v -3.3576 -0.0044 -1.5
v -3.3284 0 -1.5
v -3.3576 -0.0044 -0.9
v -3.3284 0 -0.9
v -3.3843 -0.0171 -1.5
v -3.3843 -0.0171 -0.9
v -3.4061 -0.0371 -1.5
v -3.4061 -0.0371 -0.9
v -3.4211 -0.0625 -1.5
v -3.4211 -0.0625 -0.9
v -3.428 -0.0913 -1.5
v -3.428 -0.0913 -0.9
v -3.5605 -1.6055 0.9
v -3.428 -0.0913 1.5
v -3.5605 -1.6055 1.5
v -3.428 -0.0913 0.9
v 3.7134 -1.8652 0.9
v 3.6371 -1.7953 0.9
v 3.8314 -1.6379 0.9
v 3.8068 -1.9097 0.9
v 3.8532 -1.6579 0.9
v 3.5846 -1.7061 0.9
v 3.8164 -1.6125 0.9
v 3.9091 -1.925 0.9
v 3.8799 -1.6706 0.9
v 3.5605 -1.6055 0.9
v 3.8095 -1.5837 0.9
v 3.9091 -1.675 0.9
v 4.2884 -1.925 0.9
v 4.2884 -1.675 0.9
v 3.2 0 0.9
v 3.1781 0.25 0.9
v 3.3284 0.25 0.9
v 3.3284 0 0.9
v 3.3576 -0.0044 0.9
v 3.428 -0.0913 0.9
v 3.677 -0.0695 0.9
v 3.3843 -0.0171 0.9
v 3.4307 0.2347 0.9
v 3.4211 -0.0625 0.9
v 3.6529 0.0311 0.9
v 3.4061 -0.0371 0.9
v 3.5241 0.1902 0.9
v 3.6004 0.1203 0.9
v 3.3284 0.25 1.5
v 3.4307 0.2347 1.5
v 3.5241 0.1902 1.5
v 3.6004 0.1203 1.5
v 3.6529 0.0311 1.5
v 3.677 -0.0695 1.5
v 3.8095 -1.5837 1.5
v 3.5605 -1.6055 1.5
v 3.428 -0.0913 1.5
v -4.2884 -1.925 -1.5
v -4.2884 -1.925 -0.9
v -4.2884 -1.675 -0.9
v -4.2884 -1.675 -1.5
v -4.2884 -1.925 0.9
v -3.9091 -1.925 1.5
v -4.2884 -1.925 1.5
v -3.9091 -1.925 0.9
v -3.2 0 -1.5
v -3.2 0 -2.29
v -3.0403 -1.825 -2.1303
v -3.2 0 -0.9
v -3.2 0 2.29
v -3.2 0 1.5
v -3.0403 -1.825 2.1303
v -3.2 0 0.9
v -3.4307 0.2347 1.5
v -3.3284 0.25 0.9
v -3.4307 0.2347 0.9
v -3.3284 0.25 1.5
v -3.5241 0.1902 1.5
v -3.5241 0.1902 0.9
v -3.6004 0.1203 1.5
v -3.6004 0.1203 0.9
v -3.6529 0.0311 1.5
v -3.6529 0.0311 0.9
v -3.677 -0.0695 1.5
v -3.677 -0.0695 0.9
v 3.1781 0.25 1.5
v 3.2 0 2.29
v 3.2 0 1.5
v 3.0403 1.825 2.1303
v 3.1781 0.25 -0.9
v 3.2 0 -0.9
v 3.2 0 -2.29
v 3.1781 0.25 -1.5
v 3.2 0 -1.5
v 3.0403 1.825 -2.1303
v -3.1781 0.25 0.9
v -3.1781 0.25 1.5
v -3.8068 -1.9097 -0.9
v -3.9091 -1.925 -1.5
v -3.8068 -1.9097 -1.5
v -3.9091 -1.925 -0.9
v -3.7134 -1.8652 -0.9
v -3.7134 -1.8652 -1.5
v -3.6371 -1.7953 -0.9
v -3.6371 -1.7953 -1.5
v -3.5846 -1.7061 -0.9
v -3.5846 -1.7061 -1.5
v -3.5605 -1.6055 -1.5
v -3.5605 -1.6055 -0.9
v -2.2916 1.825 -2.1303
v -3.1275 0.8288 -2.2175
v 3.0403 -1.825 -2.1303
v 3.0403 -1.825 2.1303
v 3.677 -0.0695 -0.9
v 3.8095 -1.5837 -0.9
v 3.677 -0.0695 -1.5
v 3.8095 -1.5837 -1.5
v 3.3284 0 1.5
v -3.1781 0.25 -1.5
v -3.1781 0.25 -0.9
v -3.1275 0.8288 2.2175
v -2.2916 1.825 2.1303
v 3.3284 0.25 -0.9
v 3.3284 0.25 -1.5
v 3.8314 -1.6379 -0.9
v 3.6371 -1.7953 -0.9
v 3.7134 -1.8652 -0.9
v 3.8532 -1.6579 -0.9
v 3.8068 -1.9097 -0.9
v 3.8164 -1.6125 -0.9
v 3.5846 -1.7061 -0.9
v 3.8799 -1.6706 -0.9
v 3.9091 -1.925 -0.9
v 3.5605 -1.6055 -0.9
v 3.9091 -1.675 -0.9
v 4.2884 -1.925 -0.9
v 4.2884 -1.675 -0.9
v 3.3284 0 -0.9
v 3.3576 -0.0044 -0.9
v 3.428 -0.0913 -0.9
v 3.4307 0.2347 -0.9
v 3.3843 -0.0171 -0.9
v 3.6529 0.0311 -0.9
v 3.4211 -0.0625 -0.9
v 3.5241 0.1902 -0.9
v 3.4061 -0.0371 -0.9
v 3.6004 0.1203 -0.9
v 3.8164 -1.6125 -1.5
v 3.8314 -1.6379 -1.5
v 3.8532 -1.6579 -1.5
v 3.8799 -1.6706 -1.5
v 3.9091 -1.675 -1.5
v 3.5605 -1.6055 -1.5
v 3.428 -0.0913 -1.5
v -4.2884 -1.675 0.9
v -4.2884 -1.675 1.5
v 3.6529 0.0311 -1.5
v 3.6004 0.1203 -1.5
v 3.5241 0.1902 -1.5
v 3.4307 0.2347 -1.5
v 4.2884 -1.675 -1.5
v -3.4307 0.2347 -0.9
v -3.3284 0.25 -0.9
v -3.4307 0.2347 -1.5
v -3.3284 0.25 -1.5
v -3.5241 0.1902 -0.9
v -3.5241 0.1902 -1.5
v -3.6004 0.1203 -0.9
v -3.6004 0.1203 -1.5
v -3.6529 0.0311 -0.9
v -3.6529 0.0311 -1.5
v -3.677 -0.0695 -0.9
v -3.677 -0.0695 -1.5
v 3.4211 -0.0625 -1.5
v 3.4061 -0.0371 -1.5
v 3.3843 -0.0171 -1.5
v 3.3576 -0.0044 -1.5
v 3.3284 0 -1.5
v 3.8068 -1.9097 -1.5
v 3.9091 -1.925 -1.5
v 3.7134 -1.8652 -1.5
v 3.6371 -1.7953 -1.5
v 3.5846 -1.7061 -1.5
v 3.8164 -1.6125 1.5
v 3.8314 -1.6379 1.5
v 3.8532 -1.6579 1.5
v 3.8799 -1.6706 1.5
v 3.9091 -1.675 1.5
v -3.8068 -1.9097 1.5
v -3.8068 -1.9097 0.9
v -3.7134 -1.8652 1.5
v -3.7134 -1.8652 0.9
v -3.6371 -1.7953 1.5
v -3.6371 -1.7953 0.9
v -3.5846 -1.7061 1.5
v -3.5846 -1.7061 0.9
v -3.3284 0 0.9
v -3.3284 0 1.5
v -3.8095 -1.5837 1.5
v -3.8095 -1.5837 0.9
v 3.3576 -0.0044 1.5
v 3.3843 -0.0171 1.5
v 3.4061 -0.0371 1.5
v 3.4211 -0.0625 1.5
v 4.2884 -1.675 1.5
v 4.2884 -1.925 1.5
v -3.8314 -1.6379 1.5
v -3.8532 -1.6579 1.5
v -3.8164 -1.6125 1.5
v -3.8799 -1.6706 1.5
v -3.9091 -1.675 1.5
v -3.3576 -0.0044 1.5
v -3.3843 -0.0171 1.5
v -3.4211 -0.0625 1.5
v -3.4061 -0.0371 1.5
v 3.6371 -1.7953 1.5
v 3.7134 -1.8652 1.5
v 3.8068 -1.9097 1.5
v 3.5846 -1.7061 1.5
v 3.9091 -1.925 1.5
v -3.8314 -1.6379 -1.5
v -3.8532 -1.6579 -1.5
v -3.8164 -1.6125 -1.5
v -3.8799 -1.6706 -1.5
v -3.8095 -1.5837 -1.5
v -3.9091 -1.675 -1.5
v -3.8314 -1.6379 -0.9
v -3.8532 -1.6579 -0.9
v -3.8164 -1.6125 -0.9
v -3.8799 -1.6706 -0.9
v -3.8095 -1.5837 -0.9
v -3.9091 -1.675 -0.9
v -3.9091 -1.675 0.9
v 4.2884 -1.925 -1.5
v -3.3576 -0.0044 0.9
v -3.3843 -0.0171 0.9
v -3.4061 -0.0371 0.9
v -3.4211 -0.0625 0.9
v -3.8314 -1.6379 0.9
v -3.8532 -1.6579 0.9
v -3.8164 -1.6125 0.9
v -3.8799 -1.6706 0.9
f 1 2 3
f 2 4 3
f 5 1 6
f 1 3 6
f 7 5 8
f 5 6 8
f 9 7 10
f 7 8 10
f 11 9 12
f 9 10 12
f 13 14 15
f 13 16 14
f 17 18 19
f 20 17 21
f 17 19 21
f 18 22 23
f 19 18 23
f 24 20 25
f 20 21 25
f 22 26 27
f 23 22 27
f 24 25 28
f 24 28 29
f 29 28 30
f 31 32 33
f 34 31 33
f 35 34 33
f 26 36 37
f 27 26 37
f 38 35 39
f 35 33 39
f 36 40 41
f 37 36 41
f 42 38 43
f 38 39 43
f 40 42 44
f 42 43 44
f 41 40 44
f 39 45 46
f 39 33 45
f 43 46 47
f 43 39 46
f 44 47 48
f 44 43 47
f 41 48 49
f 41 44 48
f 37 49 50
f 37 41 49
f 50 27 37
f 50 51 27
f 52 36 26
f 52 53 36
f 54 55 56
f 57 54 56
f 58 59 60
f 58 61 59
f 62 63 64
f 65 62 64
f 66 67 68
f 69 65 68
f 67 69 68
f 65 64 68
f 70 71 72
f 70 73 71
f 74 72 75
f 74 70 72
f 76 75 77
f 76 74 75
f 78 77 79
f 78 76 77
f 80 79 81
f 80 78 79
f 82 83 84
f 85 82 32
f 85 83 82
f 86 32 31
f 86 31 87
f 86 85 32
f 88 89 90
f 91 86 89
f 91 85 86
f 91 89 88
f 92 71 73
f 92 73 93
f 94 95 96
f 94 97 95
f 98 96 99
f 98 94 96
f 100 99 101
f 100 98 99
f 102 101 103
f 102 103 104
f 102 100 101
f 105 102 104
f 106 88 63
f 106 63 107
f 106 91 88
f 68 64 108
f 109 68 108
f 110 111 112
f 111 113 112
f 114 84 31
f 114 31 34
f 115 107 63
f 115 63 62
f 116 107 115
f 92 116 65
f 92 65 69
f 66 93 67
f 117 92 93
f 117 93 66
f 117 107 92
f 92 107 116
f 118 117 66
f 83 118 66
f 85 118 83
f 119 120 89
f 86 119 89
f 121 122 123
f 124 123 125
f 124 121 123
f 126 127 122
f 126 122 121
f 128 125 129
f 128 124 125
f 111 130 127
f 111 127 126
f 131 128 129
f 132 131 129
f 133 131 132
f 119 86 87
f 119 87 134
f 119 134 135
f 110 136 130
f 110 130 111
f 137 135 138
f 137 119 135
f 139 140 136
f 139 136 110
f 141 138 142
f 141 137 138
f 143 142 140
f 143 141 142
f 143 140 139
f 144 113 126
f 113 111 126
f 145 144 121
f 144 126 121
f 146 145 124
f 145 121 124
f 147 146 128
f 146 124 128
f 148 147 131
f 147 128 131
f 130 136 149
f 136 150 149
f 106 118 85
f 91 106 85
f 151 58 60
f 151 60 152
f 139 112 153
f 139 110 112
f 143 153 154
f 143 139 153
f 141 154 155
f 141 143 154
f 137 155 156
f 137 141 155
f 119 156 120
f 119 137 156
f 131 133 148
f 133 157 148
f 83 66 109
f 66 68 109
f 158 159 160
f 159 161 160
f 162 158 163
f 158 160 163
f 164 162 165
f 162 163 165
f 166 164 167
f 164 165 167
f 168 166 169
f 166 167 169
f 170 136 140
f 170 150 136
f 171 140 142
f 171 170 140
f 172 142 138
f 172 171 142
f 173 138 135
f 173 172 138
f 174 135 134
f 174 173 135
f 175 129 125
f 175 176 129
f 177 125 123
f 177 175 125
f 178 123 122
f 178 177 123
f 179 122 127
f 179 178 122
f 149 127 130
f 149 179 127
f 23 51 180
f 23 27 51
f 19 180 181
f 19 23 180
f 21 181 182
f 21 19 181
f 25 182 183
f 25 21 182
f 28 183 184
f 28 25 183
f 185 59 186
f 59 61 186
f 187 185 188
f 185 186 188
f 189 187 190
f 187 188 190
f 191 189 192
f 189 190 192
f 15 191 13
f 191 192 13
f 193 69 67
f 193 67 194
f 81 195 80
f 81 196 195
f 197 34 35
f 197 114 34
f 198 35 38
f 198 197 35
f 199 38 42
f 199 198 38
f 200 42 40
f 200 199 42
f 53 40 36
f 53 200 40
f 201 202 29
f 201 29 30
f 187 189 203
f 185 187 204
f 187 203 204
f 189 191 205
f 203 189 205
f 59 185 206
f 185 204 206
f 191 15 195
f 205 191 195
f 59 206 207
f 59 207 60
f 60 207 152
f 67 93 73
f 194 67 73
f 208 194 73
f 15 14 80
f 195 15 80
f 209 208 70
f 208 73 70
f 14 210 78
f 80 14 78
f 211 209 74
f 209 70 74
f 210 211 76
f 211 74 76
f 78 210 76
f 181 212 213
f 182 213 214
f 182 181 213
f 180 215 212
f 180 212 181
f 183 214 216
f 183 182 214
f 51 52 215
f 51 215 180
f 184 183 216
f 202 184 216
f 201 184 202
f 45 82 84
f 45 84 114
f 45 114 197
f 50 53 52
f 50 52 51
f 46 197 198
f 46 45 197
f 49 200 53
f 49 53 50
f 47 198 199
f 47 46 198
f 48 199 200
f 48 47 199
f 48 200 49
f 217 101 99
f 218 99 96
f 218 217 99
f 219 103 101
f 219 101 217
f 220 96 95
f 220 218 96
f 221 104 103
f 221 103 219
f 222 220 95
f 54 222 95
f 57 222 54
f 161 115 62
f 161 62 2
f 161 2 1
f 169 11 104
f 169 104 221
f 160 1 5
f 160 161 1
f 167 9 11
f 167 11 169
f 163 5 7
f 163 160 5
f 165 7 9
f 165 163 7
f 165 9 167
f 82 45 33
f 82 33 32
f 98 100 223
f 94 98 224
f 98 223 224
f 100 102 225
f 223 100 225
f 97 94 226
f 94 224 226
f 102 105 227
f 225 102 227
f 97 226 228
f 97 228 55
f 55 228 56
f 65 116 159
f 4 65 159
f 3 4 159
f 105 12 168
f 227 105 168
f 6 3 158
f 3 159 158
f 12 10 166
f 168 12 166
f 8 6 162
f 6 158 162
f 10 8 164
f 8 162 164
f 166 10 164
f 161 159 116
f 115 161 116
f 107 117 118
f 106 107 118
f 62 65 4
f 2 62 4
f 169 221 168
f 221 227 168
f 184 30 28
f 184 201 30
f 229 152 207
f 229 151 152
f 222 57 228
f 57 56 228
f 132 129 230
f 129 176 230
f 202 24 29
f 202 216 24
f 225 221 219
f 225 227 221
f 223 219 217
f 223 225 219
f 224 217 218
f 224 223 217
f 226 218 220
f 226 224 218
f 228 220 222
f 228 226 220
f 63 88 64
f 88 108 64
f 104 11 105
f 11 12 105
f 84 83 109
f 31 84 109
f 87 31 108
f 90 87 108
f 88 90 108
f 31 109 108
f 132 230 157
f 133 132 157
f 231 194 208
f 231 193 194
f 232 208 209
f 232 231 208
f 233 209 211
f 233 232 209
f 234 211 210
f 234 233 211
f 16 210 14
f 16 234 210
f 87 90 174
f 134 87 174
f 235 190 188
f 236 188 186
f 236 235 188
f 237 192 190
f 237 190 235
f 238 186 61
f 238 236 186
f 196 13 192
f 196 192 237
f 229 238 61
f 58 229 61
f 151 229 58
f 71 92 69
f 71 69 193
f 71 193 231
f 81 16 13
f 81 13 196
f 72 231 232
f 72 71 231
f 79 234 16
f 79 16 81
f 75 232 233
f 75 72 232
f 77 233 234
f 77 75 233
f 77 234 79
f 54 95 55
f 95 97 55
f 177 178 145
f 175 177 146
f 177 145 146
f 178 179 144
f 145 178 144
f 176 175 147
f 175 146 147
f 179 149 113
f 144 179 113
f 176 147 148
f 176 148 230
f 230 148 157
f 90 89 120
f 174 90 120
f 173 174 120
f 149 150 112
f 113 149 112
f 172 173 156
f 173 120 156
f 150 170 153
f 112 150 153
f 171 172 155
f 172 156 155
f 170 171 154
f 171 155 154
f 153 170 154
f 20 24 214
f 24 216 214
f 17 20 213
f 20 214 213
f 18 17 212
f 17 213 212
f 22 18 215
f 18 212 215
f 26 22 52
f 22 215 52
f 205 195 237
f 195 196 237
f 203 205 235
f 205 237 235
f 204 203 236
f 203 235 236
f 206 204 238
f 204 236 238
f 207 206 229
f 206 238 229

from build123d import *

# Parameters (mm, degrees)
SKETCH1_W                = 6.4
SKETCH1_H                = 4.58
EXTRUDE1_DEPTH           = 1.825
EXTRUDE1_TAPER           = 5
EXTRUDE1_OTHER_WAY_DEPTH = 1.825
EXTRUDE1_OTHER_WAY_TAPER = 5
CHAMFER1_SIZE            = 1
CHAMFER1_SIZE_2          = 0.748750861
EXTRUDE2_START           = 1.2
EXTRUDE2_DEPTH           = 0.3
FILLET1_R                = 0.1
FILLET2_R                = 0.35


with BuildPart() as part:
    # Sketch1 → Extrude1 (new body)
    with BuildSketch(Plane(origin=(0, 0, 0), x_dir=(1, 0, 0), z_dir=(0, 1, 0))):
        Rectangle(SKETCH1_W, SKETCH1_H)
    extrude(amount=EXTRUDE1_DEPTH, taper=EXTRUDE1_TAPER)

    # Sketch1 → Extrude1 other way (add)
    with BuildSketch(Plane(origin=(0, 0, 0), x_dir=(1, 0, 0), z_dir=(0, 1, 0))):
        Rectangle(SKETCH1_W, SKETCH1_H)
    extrude(amount=-EXTRUDE1_OTHER_WAY_DEPTH, taper=EXTRUDE1_OTHER_WAY_TAPER)

    # Chamfer1
    # the kernel refuses this chamfer: 1, 0.748750861 mm, written as the material it takes off along each edge
    with BuildSketch(Plane(origin=(-3.040333189, 1.825, -4.712885419), x_dir=(-0.10925940413866445, -0.9940132708406181, 0), z_dir=(0, 0, 1))) as chamfer1_piece_1:
        Polygon((CHAMFER1_SIZE * 0.999753334764, CHAMFER1_SIZE * 0.0222096741985), (-CHAMFER1_SIZE_2 * 0.109259404139, CHAMFER1_SIZE_2 * 0.994013270843), (0, 0), align=None)
    extrude(amount=9.425770839, mode=Mode.SUBTRACT)

    # Sketch2 → Extrude2 (add, symmetric)
    with BuildSketch(Plane.XY.offset(EXTRUDE2_START)):
        Polygon((-2.92973568, 0), (-3.42, 0), (-3.588415677, -1.925), (-4.288415677, -1.925), (-4.288415677, -1.675), (-3.817498471, -1.675), (-3.649082794, 0.25), (-2.92973568, 0.25), align=None)
        Polygon((2.92973568, 0.25), (2.92973568, 0), (3.42, 0), (3.588415677, -1.925), (4.288415677, -1.925), (4.288415677, -1.675), (3.817498471, -1.675), (3.649082794, 0.25), align=None)
    extrude2 = extrude(amount=EXTRUDE2_DEPTH, both=True)

    # Mirror1: Extrude2 across plane
    add(extrude2.mirror(Plane.XY))

    # Fillet1
    fillet1_edges = [part.edges().sort_by_distance(p)[0] for p in [
        (3.817498471, -1.675, -1.2),
        (3.42, 0, -1.2),
        (-3.817498471, -1.675, 1.2),
        (-3.42, 0, 1.2),
        (3.42, 0, 1.2),
        (3.817498471, -1.675, 1.2),
        (-3.42, 0, -1.2),
        (-3.817498471, -1.675, -1.2),
    ]]
    fillet(fillet1_edges, radius=FILLET1_R)

    # Fillet2
    fillet2_edges = [part.edges().sort_by_distance(p)[0] for p in [
        (3.649082794, 0.25, -1.2),
        (3.588415677, -1.925, -1.2),
        (-3.649082794, 0.25, 1.2),
        (-3.588415677, -1.925, 1.2),
        (3.649082794, 0.25, 1.2),
        (3.588415677, -1.925, 1.2),
        (-3.649082794, 0.25, -1.2),
        (-3.588415677, -1.925, -1.2),
    ]]
    fillet(fillet2_edges, radius=FILLET2_R)


solid = part.part
